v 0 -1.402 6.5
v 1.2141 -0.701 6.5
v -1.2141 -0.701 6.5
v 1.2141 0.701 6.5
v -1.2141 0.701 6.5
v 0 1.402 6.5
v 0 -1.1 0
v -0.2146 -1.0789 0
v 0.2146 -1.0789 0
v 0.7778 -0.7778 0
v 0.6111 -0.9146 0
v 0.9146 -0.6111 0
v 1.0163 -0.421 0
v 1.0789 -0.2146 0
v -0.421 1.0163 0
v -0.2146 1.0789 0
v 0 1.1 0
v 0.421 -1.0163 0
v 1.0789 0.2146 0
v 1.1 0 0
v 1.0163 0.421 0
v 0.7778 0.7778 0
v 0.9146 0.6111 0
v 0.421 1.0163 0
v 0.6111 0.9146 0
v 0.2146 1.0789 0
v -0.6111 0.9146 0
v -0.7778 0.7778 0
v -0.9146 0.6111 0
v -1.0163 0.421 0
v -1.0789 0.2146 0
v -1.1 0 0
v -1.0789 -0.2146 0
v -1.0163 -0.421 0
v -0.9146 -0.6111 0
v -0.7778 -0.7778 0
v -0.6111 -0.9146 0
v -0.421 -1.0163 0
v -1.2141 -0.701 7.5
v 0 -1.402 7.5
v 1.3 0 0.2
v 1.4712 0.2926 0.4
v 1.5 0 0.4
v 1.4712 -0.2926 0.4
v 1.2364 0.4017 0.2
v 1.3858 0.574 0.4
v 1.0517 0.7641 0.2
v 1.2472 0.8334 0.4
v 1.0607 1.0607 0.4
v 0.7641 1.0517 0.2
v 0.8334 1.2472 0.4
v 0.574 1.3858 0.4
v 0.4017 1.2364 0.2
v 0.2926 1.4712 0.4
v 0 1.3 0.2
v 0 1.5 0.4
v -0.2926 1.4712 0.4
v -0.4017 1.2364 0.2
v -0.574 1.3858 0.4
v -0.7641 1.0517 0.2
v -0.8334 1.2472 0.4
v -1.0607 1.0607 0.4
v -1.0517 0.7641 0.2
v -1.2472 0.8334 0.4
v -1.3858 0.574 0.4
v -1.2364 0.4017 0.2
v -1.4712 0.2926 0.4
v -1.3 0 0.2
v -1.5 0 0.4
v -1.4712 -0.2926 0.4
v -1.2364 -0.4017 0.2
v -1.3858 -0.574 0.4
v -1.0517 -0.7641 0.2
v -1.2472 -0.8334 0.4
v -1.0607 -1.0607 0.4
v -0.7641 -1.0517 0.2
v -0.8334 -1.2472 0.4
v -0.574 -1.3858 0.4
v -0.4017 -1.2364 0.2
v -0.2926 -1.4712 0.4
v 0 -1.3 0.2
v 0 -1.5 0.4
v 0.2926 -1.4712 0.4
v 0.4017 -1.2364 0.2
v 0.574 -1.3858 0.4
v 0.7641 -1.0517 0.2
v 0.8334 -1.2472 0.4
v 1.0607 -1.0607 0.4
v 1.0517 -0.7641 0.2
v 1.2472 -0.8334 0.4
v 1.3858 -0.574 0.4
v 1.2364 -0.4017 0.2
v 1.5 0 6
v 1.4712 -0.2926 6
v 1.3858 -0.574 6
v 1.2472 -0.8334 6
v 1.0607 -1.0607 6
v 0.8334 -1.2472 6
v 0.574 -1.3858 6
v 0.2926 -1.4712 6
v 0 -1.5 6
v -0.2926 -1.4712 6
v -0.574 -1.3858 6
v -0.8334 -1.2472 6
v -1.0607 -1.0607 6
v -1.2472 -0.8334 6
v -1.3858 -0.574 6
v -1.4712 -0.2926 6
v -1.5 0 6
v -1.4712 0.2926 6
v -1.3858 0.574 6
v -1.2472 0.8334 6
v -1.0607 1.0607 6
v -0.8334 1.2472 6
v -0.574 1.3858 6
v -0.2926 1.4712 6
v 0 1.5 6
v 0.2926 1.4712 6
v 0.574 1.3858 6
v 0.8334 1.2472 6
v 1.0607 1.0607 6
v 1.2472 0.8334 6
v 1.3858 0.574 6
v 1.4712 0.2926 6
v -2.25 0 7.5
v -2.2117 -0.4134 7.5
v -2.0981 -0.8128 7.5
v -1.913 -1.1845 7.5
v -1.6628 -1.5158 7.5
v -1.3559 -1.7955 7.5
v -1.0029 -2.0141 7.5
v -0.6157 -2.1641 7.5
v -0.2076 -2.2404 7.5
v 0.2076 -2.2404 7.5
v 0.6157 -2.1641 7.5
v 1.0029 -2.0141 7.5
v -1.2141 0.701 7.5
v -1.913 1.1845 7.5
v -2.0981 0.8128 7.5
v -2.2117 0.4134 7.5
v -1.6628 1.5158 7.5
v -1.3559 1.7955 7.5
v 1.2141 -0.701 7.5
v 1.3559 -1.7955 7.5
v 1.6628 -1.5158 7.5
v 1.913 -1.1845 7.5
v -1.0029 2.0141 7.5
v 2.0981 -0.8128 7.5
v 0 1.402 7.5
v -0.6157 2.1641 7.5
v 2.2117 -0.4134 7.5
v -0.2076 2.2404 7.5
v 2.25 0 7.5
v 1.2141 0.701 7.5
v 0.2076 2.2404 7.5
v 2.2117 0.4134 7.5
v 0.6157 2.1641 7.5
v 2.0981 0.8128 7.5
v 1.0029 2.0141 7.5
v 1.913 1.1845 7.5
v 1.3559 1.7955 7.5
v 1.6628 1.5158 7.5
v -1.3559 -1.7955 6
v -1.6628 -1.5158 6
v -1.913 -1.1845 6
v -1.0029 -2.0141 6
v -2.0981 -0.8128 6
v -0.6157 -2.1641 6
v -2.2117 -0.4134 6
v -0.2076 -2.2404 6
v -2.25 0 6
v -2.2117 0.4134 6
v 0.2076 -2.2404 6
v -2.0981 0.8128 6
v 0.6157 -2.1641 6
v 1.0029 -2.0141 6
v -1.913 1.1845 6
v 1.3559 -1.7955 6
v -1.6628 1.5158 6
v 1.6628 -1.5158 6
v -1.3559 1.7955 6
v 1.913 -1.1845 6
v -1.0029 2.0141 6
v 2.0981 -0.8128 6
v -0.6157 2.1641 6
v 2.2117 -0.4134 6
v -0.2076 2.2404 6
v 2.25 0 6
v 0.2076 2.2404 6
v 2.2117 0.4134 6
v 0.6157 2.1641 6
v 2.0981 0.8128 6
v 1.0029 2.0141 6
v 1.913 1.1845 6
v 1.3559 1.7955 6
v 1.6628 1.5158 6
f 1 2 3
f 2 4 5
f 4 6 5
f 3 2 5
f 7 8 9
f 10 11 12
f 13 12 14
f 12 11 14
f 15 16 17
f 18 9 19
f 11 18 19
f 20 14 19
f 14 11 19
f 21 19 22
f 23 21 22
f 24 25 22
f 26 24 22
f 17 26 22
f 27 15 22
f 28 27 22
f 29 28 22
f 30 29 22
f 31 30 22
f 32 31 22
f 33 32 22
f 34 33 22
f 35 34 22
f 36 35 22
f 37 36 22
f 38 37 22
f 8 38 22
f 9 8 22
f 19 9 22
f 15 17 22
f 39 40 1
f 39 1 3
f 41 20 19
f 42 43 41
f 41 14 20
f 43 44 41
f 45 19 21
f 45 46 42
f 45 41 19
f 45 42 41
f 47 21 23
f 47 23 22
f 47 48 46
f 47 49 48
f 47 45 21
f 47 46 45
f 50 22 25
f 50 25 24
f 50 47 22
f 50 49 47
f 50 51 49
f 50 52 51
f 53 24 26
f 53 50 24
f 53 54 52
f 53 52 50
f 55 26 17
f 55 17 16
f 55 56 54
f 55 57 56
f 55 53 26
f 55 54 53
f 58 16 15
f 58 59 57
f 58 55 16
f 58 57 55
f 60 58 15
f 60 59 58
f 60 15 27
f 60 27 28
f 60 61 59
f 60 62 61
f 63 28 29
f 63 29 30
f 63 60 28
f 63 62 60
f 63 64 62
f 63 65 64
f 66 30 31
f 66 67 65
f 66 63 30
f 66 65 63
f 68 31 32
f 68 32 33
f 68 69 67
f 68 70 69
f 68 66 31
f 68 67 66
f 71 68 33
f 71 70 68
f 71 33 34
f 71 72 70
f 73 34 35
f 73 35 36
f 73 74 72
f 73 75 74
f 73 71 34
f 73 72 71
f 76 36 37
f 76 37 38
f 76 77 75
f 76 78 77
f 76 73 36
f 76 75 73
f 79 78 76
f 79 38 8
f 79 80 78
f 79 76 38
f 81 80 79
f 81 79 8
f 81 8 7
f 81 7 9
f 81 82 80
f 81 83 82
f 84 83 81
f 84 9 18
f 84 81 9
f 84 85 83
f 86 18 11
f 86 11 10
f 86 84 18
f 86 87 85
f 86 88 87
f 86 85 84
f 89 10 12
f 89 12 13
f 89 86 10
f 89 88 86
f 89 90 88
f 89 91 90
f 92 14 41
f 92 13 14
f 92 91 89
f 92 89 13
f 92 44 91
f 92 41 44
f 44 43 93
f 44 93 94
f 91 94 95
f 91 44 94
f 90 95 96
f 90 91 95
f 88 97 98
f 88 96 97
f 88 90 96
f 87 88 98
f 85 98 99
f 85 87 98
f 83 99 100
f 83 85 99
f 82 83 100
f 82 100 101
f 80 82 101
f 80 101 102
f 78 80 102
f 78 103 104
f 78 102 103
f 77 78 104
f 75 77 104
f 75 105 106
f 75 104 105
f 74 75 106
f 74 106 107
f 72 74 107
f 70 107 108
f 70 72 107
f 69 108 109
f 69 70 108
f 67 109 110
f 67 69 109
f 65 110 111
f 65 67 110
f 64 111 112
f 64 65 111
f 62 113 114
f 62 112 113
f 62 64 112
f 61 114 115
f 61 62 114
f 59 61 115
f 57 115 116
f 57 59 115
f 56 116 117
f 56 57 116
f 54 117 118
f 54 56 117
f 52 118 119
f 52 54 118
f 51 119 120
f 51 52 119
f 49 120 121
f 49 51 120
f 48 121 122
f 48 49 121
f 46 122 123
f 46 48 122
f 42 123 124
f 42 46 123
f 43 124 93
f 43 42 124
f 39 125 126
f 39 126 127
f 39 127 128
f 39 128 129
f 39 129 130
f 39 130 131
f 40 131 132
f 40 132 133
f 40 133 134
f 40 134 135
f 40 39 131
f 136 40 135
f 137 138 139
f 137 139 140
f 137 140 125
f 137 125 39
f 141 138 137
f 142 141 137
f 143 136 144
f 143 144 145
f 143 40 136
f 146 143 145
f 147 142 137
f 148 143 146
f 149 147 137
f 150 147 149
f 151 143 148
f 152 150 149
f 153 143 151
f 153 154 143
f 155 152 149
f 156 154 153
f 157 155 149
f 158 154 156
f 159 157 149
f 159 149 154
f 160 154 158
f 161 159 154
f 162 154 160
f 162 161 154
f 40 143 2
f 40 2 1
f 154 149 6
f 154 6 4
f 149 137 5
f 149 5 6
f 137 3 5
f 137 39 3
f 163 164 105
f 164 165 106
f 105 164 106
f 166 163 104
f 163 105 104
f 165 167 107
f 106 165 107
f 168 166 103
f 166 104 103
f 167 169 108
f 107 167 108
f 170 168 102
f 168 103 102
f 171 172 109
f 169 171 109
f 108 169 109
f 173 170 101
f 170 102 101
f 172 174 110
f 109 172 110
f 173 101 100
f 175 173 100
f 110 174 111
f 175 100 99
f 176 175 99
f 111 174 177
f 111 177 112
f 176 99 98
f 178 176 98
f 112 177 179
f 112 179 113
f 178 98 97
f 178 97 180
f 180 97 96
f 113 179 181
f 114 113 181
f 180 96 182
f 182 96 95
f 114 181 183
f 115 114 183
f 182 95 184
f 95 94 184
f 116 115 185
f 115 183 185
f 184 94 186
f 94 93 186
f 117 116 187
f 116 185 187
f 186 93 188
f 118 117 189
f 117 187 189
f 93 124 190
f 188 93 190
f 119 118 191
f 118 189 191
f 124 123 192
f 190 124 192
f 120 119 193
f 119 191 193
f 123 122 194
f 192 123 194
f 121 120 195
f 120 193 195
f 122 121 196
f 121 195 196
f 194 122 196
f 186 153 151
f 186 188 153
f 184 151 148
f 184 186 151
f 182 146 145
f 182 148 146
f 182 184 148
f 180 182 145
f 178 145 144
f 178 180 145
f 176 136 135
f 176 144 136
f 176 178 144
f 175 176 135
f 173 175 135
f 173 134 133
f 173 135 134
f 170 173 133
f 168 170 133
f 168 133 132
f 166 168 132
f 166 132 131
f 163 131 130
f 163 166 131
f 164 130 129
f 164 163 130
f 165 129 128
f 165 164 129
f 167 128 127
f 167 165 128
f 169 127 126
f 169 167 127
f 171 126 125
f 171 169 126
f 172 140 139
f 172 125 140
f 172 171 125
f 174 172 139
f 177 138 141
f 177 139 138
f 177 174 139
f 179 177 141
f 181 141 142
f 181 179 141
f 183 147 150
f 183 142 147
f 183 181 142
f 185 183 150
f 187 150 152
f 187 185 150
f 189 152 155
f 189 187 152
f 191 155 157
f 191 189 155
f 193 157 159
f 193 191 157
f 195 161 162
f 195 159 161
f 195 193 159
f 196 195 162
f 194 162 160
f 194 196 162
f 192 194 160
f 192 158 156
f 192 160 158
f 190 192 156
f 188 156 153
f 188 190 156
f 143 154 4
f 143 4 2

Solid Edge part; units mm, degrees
sketch "Sketch1" plane through (0, 0, 0) normal (0, 0, 1) x (1, 0, 0)
  circle A0 centre (0, 0) radius 1.5
extrude "Protrusion1" add sketch "Sketch1" along normal blind 6
sketch "Sketch2" plane through (0, 0, 6) normal (0, 0, 1) x (1, 0, 0)
  circle A0 centre (0, 0) radius 2.25
extrude "ProtrusiónExtruida_2" add sketch "Sketch2" along normal blind 1.5
sketch "Sketch3" plane through (0, 0, 7.5) normal (0, 0, 1) x (1, 0, 0)
  line L0 (0, 1.402) -> (1.2141, 0.701)
  line L1 (1.2141, 0.701) -> (1.2141, -0.701)
  line L2 (1.2141, -0.701) -> (0, -1.402)
  line L3 (0, -1.402) -> (-1.2141, -0.701)
  line L4 (-1.2141, -0.701) -> (-1.2141, 0.701)
  line L5 (-1.2141, 0.701) -> (0, 1.402)
extrude "VaciadoExtruido_1" cut sketch "Sketch3" against normal blind 1
chamfer "Chaflán_1" distance 0.4 angle 45 1 edges at (-1.5, 0, 0)
properties material "Acero inoxidable, 303"
